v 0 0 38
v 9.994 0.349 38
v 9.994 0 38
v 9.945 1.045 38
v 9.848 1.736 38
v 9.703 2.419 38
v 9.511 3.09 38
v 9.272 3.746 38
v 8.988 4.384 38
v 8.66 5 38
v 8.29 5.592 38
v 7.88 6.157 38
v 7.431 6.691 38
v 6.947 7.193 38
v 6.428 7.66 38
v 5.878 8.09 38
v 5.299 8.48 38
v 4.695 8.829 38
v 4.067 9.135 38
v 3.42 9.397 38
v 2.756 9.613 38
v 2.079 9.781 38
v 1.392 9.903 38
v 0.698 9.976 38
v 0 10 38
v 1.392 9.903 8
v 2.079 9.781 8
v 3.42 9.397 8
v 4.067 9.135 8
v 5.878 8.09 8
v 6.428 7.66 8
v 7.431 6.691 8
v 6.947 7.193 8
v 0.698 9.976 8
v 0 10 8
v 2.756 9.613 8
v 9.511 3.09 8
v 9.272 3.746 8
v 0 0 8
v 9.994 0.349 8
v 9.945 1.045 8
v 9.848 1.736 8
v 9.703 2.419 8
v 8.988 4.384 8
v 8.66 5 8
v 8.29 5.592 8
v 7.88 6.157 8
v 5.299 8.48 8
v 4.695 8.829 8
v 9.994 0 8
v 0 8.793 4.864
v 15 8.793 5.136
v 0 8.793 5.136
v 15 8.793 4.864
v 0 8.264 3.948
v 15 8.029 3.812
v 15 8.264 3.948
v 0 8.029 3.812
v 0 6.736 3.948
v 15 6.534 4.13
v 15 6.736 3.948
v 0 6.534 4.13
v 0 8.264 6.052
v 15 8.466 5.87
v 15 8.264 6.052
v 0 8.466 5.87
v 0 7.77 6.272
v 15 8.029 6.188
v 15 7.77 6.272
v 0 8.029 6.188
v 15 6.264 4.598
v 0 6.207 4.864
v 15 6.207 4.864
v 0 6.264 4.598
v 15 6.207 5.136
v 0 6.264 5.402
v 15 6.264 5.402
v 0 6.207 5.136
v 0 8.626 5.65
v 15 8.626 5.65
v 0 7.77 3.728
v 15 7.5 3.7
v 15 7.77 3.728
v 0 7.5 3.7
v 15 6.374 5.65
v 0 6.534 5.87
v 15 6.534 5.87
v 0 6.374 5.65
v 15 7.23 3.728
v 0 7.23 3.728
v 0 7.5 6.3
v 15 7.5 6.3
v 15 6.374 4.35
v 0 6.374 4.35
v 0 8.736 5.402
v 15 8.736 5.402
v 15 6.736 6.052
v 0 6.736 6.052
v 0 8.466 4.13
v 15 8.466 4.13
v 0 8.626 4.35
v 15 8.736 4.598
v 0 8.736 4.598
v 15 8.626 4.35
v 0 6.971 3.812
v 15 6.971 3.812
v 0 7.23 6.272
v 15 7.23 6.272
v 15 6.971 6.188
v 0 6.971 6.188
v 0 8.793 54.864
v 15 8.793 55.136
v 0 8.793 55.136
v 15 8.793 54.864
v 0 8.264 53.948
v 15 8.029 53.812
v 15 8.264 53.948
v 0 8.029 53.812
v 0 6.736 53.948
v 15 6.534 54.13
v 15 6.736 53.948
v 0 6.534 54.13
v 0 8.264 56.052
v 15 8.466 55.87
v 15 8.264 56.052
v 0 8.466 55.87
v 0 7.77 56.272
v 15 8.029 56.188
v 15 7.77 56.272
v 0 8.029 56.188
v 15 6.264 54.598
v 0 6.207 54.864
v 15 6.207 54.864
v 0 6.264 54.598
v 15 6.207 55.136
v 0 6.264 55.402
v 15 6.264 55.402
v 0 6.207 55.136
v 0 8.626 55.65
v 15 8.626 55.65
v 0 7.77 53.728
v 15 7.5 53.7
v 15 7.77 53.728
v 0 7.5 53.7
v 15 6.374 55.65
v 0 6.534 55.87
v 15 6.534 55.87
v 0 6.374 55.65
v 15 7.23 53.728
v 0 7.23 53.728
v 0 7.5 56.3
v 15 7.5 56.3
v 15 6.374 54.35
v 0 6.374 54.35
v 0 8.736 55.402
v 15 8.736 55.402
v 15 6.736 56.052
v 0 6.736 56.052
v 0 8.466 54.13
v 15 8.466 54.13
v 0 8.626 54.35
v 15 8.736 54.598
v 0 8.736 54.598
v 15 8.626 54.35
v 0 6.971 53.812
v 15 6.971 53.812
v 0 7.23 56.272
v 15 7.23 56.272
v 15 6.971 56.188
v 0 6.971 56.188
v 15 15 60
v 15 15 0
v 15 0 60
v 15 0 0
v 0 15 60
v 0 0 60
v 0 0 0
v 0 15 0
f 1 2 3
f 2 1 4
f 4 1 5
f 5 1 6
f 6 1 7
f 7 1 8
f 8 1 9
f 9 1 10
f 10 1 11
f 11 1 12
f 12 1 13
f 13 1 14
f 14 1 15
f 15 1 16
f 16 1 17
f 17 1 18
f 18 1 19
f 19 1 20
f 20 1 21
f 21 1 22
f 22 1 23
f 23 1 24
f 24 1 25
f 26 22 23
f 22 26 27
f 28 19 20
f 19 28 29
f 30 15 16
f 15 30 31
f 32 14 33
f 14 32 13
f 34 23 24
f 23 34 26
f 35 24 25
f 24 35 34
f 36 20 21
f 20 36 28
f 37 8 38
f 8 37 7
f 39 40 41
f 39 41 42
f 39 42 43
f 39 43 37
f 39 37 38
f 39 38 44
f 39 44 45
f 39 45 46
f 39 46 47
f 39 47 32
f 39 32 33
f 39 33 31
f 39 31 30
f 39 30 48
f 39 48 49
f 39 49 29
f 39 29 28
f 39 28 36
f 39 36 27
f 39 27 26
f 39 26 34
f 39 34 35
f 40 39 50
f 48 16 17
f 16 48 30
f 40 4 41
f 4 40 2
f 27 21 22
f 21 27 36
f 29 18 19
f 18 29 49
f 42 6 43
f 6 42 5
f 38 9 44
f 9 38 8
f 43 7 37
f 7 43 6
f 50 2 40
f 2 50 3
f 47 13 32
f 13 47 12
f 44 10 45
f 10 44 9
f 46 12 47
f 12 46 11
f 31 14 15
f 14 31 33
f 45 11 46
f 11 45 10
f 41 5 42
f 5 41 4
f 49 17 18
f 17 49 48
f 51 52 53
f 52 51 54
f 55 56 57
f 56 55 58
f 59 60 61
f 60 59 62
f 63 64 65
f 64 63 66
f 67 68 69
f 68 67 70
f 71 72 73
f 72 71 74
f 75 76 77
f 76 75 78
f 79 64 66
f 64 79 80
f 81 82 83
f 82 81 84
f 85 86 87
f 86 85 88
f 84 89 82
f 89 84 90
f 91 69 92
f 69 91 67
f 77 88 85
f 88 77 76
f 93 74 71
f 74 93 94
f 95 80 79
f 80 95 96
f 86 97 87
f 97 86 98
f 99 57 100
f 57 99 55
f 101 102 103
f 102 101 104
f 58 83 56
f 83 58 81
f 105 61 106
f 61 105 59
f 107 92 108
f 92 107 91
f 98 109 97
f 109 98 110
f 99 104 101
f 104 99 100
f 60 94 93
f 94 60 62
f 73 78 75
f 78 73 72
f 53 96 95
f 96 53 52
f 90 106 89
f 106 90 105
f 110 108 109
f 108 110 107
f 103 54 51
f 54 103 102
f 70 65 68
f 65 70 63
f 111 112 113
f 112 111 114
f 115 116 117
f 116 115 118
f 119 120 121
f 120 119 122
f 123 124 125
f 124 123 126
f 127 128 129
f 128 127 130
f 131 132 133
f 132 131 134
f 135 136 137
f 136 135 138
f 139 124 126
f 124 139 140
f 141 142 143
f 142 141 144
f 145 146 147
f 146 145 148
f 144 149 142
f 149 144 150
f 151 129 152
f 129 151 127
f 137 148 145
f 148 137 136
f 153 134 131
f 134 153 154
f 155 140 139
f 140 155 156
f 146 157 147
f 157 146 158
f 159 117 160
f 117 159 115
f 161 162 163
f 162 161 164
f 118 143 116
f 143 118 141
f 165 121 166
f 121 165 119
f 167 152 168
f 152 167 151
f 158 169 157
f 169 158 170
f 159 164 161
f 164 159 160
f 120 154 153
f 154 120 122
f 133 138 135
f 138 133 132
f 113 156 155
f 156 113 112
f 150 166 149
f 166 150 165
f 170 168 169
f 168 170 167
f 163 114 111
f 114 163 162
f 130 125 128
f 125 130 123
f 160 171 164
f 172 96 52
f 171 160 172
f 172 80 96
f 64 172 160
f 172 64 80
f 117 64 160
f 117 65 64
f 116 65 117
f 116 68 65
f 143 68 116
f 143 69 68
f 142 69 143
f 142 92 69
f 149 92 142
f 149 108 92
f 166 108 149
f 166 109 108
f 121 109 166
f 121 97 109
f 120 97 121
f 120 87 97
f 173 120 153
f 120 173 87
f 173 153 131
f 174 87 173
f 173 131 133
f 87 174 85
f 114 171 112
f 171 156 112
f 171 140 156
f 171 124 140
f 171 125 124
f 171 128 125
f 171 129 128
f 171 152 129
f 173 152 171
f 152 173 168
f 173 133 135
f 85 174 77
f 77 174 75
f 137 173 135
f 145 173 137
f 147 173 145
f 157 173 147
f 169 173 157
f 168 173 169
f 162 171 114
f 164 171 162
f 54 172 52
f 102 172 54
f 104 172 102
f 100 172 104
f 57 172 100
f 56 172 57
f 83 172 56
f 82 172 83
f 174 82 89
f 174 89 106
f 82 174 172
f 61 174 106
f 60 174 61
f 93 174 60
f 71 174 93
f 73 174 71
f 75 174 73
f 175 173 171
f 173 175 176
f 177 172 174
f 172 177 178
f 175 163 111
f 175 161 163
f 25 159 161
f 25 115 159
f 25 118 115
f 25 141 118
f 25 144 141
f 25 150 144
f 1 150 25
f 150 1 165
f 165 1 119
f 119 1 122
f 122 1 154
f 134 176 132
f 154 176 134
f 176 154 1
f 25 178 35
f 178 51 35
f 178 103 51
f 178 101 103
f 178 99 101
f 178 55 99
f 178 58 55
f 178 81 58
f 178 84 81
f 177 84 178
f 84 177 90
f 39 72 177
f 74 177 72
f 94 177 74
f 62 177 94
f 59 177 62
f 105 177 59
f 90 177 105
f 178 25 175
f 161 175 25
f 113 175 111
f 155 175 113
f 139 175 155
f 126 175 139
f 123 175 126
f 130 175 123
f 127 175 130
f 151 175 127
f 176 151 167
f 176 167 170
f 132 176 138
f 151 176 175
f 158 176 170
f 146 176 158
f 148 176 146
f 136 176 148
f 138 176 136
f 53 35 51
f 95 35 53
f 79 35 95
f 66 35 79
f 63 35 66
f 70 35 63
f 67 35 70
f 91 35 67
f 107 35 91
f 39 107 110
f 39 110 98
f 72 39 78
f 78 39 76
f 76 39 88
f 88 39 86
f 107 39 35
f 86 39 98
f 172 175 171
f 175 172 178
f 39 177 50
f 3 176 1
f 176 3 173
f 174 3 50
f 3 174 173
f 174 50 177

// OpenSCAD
ruimte_tussen_kabels = 5;
dikte = 15;
lengte = 60;
aantal_kabels = 5;

difference(){
	union(){        
        translate([0,0,0]){
           cube([dikte,15,lengte], center=false);
        }


        
	}
	union() {
            translate([0,0,8]){
                rotate(a = [0,0,90]) {
                    cylinder(h=30, r=10, $fn=90, center=false);
                }
            }
        


        translate([-10,7.5,5]){
            rotate(a = [0,90,0]) {
                cylinder(h=400, r=1.3, $fn=30, center=false);
            }
        }	
        translate([-10,7.5,55]){
            rotate(a = [0,90,0]) {
                cylinder(h=400, r=1.3, $fn=30, center=false);
            }
        }	



	


	}
}
